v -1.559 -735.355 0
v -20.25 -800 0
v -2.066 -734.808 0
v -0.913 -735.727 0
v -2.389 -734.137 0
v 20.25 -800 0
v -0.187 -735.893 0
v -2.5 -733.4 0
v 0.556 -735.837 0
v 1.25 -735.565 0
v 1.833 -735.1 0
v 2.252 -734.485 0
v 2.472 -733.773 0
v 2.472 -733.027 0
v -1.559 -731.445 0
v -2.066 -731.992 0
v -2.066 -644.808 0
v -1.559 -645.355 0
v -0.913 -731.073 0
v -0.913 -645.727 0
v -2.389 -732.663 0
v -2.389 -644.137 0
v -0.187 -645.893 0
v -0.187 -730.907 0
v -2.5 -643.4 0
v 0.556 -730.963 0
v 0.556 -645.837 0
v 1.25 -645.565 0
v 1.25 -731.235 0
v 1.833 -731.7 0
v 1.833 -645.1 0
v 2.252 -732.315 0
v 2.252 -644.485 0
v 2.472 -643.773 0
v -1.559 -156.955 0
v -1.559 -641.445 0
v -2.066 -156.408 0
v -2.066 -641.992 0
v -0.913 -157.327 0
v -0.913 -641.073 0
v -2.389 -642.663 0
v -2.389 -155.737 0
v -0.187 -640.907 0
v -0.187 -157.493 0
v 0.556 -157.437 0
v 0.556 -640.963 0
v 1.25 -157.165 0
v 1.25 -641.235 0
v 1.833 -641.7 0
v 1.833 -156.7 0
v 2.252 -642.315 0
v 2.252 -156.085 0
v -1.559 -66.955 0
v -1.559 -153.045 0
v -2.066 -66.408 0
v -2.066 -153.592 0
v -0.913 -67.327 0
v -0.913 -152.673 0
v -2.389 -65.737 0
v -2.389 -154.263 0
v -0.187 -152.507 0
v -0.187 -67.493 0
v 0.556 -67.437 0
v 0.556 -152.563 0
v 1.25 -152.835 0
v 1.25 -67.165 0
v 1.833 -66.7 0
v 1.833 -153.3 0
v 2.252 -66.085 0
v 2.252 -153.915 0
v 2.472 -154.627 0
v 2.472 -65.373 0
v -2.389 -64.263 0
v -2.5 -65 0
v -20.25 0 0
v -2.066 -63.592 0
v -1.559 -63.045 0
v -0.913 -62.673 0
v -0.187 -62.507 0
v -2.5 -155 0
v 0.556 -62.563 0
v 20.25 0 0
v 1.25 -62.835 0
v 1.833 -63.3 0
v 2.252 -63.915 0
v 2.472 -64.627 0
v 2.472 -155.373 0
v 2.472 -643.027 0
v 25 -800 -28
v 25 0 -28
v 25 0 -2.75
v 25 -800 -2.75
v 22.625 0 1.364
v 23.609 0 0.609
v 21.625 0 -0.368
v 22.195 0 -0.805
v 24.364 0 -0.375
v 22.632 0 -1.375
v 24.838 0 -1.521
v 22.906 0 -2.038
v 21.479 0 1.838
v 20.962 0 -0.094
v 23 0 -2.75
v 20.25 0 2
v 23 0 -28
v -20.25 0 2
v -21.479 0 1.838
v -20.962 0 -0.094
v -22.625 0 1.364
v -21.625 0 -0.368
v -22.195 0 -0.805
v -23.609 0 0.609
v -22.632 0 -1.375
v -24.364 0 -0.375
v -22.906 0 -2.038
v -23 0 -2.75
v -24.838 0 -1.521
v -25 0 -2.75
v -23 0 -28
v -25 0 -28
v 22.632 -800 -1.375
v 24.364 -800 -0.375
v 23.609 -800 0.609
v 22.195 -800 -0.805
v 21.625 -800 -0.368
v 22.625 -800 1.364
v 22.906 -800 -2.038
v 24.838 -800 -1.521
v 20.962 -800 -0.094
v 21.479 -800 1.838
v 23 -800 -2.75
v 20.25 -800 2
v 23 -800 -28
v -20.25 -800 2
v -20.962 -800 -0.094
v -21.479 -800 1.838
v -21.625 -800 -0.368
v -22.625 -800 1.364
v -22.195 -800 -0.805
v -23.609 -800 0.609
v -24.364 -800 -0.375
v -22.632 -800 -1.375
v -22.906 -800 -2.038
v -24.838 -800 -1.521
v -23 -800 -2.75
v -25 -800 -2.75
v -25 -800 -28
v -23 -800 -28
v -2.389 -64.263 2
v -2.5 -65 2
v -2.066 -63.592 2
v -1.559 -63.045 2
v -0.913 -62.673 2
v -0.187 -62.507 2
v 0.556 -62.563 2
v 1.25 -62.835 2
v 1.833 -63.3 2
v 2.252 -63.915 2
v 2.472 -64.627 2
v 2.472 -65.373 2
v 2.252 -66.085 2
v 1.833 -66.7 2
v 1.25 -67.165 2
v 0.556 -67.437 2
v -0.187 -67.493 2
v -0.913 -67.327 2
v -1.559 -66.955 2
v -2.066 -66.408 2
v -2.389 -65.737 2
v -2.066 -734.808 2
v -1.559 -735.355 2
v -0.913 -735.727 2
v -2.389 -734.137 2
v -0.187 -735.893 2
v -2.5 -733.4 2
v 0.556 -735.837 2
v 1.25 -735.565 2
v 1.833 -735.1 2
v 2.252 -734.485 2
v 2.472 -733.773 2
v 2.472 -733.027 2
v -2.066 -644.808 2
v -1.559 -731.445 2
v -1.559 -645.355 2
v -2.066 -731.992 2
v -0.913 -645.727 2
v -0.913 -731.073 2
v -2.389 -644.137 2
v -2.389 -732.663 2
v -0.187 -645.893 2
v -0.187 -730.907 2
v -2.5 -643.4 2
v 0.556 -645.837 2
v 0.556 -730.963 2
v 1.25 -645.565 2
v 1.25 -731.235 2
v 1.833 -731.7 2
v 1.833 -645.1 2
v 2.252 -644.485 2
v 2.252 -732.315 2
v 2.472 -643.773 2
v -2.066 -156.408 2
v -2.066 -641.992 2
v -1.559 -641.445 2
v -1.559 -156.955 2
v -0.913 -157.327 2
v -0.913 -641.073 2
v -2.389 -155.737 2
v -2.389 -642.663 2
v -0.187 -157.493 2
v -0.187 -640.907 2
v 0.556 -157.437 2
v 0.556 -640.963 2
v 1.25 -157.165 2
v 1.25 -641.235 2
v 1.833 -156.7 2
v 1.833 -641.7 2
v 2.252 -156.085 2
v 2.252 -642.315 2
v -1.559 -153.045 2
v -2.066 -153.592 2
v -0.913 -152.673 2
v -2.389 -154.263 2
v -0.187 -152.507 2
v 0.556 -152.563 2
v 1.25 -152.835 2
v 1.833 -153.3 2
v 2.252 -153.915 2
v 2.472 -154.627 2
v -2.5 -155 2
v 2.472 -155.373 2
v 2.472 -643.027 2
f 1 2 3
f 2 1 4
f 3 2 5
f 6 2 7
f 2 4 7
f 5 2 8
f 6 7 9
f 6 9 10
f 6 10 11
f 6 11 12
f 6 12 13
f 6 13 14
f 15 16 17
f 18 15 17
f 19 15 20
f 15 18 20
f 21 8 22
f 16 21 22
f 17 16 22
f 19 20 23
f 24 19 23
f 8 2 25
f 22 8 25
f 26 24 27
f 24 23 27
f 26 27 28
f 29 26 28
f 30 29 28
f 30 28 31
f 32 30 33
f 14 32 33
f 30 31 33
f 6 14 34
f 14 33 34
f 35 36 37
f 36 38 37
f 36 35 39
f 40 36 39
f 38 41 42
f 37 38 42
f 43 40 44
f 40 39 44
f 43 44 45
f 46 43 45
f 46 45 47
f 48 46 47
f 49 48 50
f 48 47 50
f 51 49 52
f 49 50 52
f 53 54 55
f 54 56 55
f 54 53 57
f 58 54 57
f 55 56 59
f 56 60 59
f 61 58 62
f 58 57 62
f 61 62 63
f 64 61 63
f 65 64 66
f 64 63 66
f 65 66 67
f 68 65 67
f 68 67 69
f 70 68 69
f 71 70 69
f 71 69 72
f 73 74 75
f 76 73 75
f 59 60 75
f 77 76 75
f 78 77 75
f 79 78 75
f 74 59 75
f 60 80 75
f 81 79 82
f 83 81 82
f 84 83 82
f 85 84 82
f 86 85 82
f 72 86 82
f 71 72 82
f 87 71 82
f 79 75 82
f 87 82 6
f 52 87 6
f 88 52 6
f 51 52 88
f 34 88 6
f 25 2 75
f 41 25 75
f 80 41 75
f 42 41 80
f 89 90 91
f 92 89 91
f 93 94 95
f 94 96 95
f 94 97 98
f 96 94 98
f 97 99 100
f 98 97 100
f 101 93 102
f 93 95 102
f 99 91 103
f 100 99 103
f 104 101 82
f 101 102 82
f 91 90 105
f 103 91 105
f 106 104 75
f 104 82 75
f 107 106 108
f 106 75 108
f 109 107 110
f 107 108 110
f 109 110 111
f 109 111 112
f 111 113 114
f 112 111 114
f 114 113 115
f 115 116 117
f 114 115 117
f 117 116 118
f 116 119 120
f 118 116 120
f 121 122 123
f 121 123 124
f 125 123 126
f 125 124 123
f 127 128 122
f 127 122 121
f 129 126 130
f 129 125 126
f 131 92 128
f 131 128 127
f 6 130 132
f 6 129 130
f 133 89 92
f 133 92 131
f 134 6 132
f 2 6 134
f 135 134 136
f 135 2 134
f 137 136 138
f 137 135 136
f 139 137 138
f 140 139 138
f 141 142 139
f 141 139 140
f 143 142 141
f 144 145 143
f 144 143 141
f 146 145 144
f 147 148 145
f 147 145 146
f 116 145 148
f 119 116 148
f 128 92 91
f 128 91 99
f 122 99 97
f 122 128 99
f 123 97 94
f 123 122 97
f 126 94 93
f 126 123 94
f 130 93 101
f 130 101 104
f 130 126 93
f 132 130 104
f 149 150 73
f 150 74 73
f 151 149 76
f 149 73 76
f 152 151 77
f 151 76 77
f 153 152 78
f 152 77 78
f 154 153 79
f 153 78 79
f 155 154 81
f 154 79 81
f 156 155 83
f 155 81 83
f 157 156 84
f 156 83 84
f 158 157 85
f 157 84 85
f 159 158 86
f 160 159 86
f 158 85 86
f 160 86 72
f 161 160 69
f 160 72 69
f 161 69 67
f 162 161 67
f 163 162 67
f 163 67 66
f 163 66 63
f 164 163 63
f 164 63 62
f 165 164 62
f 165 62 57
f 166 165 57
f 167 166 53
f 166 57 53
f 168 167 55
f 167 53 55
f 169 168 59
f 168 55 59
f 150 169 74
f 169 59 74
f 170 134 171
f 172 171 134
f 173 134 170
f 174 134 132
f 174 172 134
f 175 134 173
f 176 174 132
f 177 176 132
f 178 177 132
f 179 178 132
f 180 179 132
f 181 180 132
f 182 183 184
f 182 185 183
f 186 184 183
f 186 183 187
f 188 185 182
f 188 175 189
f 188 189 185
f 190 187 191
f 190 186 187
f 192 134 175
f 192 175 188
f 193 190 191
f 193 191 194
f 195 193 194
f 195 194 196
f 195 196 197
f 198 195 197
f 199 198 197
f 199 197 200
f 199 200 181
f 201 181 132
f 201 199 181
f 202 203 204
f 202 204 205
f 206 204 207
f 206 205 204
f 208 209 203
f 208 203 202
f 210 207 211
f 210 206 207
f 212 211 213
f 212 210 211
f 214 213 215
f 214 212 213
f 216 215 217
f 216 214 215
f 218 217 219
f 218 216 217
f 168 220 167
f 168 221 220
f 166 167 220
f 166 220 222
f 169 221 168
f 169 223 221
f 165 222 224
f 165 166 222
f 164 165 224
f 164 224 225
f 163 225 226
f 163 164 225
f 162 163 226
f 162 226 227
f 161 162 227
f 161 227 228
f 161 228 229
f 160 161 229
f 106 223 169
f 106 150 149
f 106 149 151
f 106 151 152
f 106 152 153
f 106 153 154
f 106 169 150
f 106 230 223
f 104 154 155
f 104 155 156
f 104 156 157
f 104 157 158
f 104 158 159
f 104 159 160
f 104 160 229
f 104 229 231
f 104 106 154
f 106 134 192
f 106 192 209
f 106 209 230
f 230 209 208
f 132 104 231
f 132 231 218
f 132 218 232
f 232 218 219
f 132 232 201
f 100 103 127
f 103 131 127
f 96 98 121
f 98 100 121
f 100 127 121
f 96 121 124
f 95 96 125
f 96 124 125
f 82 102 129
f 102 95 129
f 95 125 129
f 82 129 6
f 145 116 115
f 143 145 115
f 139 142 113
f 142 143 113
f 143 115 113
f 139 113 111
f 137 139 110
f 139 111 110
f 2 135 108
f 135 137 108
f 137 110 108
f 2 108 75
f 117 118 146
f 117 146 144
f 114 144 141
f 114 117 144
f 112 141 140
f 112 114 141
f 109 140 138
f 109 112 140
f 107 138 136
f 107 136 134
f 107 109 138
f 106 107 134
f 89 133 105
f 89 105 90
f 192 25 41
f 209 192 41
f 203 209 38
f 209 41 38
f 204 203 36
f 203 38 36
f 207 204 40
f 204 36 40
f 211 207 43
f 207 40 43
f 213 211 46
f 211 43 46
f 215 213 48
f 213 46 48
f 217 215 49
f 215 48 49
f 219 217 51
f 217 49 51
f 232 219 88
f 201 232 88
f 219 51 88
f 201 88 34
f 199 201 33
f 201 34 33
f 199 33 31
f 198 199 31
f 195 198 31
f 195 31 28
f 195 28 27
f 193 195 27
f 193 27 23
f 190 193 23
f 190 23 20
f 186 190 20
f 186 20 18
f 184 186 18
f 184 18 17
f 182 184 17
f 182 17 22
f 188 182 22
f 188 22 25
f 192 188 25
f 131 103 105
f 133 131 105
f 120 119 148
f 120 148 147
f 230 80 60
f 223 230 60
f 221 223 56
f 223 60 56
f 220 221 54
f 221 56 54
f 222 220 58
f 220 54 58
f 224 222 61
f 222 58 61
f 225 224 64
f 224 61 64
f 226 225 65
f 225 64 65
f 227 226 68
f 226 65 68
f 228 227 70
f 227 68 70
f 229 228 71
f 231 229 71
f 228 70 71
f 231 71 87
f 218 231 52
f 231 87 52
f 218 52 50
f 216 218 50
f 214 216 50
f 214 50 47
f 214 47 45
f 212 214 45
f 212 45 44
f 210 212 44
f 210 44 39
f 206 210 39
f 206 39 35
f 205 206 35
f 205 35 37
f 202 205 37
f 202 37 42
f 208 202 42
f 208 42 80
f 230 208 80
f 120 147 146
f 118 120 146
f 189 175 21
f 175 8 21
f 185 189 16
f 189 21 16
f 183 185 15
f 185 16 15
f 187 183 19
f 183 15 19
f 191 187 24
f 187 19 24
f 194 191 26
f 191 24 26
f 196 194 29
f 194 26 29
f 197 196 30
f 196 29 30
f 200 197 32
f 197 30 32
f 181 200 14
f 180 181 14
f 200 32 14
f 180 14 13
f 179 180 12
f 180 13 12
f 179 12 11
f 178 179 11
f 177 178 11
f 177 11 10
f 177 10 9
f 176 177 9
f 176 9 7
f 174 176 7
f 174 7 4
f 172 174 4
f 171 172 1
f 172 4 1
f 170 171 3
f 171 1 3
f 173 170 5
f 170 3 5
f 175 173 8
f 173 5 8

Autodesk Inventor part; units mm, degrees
ref_plane "YZ Plane" through (0, 0, 0) normal (1, 0, 0) x (0, 1, 0)
ref_plane "XZ Plane" through (0, 0, 0) normal (0, 1, 0) x (-1, 0, 0)
ref_plane "XY Plane" through (0, 0, 0) normal (0, 0, 1) x (1, 0, 0)
sketch "Sketch1" plane through (0, 0, 0) normal (0, 0, 1) x (1, 0, 0)
  line L0 (-25, 0) -> (25, 0)
  line L1 (25, 0) -> (25, -800)
  line L2 (25, -800) -> (-25, -800)
  line L3 (-25, -800) -> (-25, 0)
  point P0 (0, 0)
  point P1 (0, 0)
  dimension "d0" = 50
  dimension "d1" = 800
extrude "Plate1" add sketch "Sketch1" along normal blind 2
sketch "Sketch2" plane through (23, -800, 2) normal (1, 0, 0) x (0, 1, 0)
  line L0 (800, 0) -> (0, 0)
  line L1 (0, 0) -> (0, -30)
  line L2 (0, -30) -> (800, -30)
  line L3 (800, -30) -> (800, 0)
edge flange "Flange1" height 30 angle 90 thickness 2 bend radius 2.75 thickness toward (1, 0, 0) relief tear relief width 2 relief depth 1 corner gap 2 corner form 0 edges at (25, -400, 0) (-25, -400, 0) wall of the first edge with corners at (23, 0, 2) (23, -800, 2) (23, -800, -28) (23, 0, -28)
bend "Bend1"
corner "Corner1"
sketch "Sketch3" plane through (0, 0, 0) normal (1, 0, 0) x (0, 1, 0)
  line L0 (0, -2.75) -> (-800, -2.75) projected
  line L1 (-800, -28) -> (-800, -2.75) projected
  line L2 (0, -28) -> (-800, -28) projected
  line L3 (0, -2.75) -> (0, -28) projected
  line L4 (-790, -28) -> (-770, -28)
  line L5 (-770, -28) -> (-770, -18)
  line L6 (-770, -18) -> (-790, -18)
  line L7 (-790, -18) -> (-790, -28)
  point P0 (0, 0)
  point P1 (-770, -28)
  point P2 (-790, -23)
  dimension "d13" = 20
  dimension "d14" = 10
  dimension "d17" = 10
extrude "Extrusion1" [suppressed]
sketch "Sketch4" plane through (0, 0, 0) normal (0, 0, -1) x (-1, 0, 0)
  circle A0 centre (0, -733.4) radius 2.5
  circle A1 centre (0, -643.4) radius 2.5
  circle A2 centre (0, -155) radius 2.5
  circle A3 centre (0, -65) radius 2.5
  line L0 (20.25, 0) -> (-20.25, 0) projected
  line L1 (-20.25, 0) -> (20.25, 0) projected
  point P0 (0, 0)
  point P1 (0, 0)
  point P2 (0, 0)
  dimension "d18" = 5
  dimension "d19" = 90
  dimension "d20" = 90
  dimension "d21" = 488.4
  dimension "d22" = 65
extrude "Cut1" cut sketch "Sketch4" against normal blind 2
equation "\"d23\" = Thickness"
equation "\"d2\" = Thickness"
equation "\"d3\" = BendReliefWidth"
equation "\"d4\" = BendReliefDepth"
equation "\"d5\" = MinimumRemnant"
equation "\"d6\" = TransitionRadius"
equation "\"d10\" = CornerReliefSize"
equation "\"d11\" = GapSize"
equation "\"d12\" = JacobiRadiusSize"
equation "\"BendRadius\" = Thickness"
equation "\"BendReliefWidth\" = Thickness"
equation "\"BendReliefDepth\" = 0.5 * Thickness"
equation "\"CornerReliefSize\" = 4 * Thickness"
equation "\"MinimumRemnant\" = 2 * Thickness"
equation "\"TransitionRadius\" = BendRadius"
equation "\"JacobiRadiusSize\" = BendRadius"
equation "\"GapSize\" = Thickness"
equation "\"Thickness\" = 2"
properties part number "ДМФ 053 швеллер лотка v2.0_CPY"
